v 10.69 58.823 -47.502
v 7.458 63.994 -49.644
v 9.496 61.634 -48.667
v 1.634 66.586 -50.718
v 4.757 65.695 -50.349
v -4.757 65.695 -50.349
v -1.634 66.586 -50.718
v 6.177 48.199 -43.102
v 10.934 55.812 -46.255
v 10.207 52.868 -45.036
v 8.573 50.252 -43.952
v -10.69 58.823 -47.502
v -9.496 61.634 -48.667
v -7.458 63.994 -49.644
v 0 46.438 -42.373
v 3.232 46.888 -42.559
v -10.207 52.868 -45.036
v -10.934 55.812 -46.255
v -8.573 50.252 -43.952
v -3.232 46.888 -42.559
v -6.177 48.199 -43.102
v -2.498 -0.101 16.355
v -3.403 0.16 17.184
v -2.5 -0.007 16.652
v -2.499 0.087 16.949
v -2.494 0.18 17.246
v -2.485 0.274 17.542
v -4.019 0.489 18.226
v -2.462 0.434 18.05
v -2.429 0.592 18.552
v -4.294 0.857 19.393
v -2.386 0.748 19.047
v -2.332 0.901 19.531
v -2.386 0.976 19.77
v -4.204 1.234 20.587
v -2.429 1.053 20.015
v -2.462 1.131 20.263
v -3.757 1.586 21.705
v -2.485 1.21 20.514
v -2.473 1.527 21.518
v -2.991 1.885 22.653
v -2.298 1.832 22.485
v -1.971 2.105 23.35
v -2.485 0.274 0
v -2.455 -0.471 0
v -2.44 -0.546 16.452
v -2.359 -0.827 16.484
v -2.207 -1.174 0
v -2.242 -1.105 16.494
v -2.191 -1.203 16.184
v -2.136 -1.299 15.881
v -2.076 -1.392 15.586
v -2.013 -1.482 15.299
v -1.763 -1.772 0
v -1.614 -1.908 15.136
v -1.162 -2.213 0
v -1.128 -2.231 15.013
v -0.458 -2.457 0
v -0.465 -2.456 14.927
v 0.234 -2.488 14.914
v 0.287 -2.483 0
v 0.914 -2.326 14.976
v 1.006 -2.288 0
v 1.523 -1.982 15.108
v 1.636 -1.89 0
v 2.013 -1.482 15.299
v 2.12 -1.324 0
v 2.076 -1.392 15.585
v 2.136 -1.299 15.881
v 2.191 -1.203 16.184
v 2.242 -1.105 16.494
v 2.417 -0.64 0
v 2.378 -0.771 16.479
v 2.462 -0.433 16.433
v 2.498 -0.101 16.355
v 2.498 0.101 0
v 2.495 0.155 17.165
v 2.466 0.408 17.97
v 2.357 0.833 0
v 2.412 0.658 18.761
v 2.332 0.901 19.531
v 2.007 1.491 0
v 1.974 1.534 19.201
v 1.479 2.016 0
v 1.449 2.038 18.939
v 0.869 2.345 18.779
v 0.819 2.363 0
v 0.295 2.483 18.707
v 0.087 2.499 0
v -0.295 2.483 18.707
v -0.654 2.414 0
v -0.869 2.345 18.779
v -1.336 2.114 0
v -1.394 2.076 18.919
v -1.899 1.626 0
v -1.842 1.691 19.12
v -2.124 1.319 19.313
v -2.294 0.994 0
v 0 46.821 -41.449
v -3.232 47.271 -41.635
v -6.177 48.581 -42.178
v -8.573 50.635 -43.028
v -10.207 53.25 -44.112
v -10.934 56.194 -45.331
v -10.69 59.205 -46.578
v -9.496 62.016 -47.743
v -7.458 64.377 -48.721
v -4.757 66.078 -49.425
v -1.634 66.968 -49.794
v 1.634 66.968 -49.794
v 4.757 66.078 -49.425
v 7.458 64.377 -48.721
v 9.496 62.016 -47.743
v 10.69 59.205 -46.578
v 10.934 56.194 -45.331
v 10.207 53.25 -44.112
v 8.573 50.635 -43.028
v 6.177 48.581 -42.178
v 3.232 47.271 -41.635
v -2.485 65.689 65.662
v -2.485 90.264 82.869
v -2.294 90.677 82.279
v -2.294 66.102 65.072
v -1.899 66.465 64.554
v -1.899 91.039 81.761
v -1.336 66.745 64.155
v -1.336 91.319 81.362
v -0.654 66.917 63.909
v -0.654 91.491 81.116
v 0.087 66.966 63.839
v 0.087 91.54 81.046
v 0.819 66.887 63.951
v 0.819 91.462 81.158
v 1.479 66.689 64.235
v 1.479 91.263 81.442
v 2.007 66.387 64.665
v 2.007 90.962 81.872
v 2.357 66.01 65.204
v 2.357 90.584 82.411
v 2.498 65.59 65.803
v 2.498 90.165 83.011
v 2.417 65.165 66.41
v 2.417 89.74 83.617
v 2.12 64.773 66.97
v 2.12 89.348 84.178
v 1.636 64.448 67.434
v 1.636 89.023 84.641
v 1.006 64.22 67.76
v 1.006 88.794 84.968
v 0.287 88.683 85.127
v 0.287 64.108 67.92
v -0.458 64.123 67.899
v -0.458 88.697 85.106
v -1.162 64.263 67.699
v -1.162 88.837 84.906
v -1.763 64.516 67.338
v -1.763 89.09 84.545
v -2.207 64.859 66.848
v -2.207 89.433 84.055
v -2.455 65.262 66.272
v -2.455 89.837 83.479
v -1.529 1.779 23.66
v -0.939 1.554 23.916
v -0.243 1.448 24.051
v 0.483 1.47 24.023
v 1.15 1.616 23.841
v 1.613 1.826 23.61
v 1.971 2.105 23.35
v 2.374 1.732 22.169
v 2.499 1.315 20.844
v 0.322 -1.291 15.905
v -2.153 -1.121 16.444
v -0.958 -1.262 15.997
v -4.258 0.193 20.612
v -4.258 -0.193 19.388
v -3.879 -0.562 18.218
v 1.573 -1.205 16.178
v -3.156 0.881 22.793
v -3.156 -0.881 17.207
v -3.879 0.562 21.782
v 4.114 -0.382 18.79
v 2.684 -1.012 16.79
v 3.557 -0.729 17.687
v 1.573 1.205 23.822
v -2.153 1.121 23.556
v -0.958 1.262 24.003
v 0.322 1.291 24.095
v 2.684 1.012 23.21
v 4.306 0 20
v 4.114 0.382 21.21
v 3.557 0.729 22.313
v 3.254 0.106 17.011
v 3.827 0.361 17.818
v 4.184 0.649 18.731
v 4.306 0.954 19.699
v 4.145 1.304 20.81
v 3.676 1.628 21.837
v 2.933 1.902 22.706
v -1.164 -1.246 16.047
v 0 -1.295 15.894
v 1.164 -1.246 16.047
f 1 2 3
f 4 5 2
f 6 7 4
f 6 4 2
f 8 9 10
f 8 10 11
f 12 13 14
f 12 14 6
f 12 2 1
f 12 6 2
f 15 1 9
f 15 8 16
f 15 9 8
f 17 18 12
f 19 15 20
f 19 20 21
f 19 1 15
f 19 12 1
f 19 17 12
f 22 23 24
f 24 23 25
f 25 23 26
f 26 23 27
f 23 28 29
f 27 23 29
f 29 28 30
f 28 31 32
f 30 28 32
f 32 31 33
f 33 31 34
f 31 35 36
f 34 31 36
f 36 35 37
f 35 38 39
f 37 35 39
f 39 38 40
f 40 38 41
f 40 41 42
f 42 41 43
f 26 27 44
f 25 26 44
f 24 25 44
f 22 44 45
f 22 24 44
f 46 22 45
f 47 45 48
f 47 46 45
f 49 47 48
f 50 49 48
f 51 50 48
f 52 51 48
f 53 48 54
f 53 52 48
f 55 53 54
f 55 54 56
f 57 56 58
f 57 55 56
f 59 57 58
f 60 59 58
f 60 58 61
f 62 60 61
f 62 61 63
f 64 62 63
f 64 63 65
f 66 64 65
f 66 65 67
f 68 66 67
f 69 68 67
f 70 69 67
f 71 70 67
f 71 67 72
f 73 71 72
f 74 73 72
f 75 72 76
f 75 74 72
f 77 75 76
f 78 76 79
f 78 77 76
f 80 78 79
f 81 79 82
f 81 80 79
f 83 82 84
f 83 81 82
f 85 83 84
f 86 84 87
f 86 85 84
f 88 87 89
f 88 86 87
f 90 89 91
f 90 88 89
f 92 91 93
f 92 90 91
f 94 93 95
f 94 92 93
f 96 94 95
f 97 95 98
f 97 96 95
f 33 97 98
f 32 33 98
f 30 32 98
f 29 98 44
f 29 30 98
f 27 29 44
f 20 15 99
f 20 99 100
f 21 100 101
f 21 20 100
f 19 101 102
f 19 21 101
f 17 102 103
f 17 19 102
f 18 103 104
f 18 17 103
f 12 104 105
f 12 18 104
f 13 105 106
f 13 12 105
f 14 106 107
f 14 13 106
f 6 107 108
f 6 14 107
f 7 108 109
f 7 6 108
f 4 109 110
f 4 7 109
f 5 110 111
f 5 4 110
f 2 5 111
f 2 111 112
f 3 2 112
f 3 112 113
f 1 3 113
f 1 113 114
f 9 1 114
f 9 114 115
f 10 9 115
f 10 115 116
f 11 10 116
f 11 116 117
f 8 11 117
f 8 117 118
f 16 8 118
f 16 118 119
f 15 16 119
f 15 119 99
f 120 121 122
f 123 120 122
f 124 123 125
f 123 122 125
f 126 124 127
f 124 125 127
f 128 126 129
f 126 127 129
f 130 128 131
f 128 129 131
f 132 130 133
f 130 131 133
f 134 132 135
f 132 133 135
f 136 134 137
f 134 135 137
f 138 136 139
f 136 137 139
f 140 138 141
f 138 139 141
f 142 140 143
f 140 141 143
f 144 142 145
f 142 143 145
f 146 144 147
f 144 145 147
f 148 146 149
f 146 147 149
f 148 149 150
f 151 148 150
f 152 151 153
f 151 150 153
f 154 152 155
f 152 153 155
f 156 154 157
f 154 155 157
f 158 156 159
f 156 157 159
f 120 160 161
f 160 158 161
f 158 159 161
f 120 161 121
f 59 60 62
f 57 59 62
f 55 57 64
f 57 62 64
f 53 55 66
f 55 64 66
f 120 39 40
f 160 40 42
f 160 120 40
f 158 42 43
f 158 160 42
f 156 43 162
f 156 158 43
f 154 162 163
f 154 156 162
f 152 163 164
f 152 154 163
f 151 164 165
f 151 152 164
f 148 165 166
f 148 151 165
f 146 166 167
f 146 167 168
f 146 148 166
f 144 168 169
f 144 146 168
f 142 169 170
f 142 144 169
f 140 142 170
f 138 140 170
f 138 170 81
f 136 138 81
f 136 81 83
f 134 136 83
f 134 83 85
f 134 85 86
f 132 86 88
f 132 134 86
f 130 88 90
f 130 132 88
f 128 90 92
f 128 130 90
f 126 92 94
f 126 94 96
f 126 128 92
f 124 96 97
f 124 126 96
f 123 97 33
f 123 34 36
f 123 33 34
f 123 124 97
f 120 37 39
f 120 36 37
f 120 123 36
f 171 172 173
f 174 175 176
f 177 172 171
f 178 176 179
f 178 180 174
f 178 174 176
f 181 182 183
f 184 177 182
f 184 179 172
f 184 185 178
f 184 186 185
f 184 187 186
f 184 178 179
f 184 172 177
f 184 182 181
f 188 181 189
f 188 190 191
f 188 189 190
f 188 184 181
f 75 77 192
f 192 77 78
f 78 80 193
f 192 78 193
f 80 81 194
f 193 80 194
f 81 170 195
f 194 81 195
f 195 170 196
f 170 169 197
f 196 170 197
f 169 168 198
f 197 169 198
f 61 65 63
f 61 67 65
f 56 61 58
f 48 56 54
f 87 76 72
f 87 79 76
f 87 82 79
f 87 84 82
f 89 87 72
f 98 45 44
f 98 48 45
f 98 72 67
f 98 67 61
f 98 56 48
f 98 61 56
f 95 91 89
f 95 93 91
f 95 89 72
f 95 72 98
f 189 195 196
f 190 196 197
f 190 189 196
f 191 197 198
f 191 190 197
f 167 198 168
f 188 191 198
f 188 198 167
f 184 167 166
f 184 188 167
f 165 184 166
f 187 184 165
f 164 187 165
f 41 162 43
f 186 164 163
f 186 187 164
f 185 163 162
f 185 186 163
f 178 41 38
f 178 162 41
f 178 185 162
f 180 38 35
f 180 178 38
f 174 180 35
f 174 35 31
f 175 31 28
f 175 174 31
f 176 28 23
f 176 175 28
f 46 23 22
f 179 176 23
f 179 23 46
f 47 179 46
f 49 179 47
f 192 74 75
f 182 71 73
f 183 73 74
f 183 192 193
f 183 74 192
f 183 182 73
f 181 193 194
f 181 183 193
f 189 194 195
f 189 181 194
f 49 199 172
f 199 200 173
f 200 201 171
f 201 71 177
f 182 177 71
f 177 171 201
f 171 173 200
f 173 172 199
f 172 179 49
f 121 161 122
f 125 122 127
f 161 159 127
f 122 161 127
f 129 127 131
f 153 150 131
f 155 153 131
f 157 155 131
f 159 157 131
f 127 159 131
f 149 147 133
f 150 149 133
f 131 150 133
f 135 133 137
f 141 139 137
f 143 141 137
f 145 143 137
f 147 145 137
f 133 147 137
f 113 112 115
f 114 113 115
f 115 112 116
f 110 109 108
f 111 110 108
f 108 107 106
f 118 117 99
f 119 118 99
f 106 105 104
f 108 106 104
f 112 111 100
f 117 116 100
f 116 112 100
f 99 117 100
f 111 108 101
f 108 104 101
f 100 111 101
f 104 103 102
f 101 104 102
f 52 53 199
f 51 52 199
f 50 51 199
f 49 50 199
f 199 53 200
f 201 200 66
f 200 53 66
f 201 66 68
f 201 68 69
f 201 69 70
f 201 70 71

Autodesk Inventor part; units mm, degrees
ref_plane "YZ Plane" through (0, 0, 0) normal (1, 0, 0) x (0, 1, 0)
ref_plane "XZ Plane" through (0, 0, 0) normal (0, 1, 0) x (-1, 0, 0)
ref_plane "XY Plane" through (0, 0, 0) normal (0, 0, 1) x (1, 0, 0)
ref_plane "Work Plane4" through (0, 0, 10) normal (-0.994, 0.1092, 0) x (-0.1092, -0.994, 0)
ref_plane "Work Plane3" through (-40.2485, 19.0101, 10) normal (-0.994, 0.1092, 0) x (-0.1092, -0.994, 0)
sketch "Sketch1" plane through (0, 0, 10) normal (-1, 0, 0) x (0, -1, 0)
  line L0 (0, -10) -> (0, 10)
  line L1 (0, 10) -> (-65.5322, 55.8861)
  line L2 (-7.1094, 12.5876) -> (7.1094, 7.4124)
  line L3 (-65.5322, 55.8861) -> (-90.1067, 73.0934)
  dimension "d0" = 20
  dimension "d1" = 80
  dimension "d2" = 125
  dimension "d6" = 70
  dimension "d23" = 30
  dimension "d26" = 180
ref_plane "Work Plane9" through (-18.0552, 1.9841, 10) normal (0, 0, -1) x (-0.994, 0.1092, 0)
sketch "Sketch3" plane through (-18.0552, 1.9841, 10) normal (0, 0, -1) x (-0.994, 0.1092, 0)
  circle A0 centre (-18.1638, 0) radius 11.5 projected
  circle A1 centre (-18.1638, 0) radius 2.5
  point P0 (-18.1638, 0)
  dimension "d7" = 5
sweep "Sweep1" add profiles "Sketch3" path "Sketch1" path curves L0 L1 L3 contours A1
sketch "Sketch7" plane through (0, 0, 10) normal (-1, 0, 0) x (0, -1, 0)
  line L0 (0, 10) -> (0, 10) projected
  line L1 (0, 10) -> (0, 10) projected
  line L2 (2.5, -10) -> (-2.5, -10) projected
  line L3 (0, 0) -> (0, 0) projected
  line L4 (0, 0) -> (0, 0) projected
  line L5 (2.5, -10) -> (2.5, 0.7882) projected
  line L6 (-2.5, -10) -> (-2.5, -0.7882) projected
  line L7 (-2.5, -0.7882) -> (2.8679, 0.9042) projected
  line L8 (0, -10) -> (0, 10)
  line L9 (1.4822, 5.299) -> (-7.1718, 32.746)
  line L10 (-7.1718, 32.746) -> (17.2582, 19.3562)
  line L11 (17.2582, 19.3562) -> (10.5548, 1.8291)
  line L12 (10.5548, 1.8291) -> (1.4822, 5.299)
  line L13 (-48.3403, -54.2978) -> (-48.6823, -53.3019)
  line L14 (-73.7647, -67.98) -> (-66.6763, -71.8283)
  line L15 (-66.6763, -71.8283) -> (-47.7403, -64.4229)
  line L16 (-47.7403, -64.4229) -> (-48.3403, -54.2978)
  line L17 (-55.533, -59.0685) -> (-56.5685, -56.5685) projected
  line L18 (-48.6823, -53.3019) -> (-76.2479, -64.72)
  line L19 (-76.2479, -64.72) -> (-73.7647, -67.98)
  point P0 (-65.0552, -65.9873)
extrude "Extrusion4" cut sketch "Sketch7" along normal mid plane 10 contours L9 L10 L11 L12
sketch "Sketch8" plane through (0, 0, 20) normal (0, -0.9537, 0.3007) x (1, 0, 0)
  ellipse E0 centre (0, 0) end of major axis (0, 4.1067) minor radius 2.5 (2.5, 0) -> (-2.5, 0) ccw projected
  circle A0 centre (0, 0) radius 4.3056
  ellipse E1 centre (0, 0) end of major axis (0, -8.3138) minor radius 2.5 (2.0132, -4.9292) -> (2.5, 0) ccw projected
  ellipse E2 centre (0, 0) end of major axis (0, -8.3138) minor radius 2.5 (-2.5, 0) -> (-2.0132, -4.9292) ccw projected
  line L0 (-2.0132, -4.9292) -> (2.0132, -4.9292) projected
  point P0 (0, -9.5372)
extrude "Extrusion5" add sketch "Sketch8" against normal blind 1 contours E1 A0 E2 E0 | E0 E2 A0 E1
ref_plane "Work Plane10" through (-6.4984, 57.0254, -46.7578) normal (0, -0.3827, -0.9239) x (0, -0.9239, 0.3827)
sketch "Sketch9" plane through (-6.4984, 57.0254, -46.7578) normal (0, -0.3827, -0.9239) x (0, -0.9239, 0.3827)
  ellipse E0 centre (0.4945, -6.4984) end of major axis (-6.0383, -6.4984) minor radius 2.5 projected
  circle A0 centre (0.4945, -6.4984) radius 10.9648
  point P0 (70.578, -6.4984)
extrude "Extrusion6" add sketch "Sketch9" against normal blind 1 contours E0 | A0
ref_plane "Work Plane2" through (-1.6385, -14.9102, 10) normal (0, 0, 1) x (0.994, -0.1092, 0)
properties part number "cellSTORM_lightpath"
